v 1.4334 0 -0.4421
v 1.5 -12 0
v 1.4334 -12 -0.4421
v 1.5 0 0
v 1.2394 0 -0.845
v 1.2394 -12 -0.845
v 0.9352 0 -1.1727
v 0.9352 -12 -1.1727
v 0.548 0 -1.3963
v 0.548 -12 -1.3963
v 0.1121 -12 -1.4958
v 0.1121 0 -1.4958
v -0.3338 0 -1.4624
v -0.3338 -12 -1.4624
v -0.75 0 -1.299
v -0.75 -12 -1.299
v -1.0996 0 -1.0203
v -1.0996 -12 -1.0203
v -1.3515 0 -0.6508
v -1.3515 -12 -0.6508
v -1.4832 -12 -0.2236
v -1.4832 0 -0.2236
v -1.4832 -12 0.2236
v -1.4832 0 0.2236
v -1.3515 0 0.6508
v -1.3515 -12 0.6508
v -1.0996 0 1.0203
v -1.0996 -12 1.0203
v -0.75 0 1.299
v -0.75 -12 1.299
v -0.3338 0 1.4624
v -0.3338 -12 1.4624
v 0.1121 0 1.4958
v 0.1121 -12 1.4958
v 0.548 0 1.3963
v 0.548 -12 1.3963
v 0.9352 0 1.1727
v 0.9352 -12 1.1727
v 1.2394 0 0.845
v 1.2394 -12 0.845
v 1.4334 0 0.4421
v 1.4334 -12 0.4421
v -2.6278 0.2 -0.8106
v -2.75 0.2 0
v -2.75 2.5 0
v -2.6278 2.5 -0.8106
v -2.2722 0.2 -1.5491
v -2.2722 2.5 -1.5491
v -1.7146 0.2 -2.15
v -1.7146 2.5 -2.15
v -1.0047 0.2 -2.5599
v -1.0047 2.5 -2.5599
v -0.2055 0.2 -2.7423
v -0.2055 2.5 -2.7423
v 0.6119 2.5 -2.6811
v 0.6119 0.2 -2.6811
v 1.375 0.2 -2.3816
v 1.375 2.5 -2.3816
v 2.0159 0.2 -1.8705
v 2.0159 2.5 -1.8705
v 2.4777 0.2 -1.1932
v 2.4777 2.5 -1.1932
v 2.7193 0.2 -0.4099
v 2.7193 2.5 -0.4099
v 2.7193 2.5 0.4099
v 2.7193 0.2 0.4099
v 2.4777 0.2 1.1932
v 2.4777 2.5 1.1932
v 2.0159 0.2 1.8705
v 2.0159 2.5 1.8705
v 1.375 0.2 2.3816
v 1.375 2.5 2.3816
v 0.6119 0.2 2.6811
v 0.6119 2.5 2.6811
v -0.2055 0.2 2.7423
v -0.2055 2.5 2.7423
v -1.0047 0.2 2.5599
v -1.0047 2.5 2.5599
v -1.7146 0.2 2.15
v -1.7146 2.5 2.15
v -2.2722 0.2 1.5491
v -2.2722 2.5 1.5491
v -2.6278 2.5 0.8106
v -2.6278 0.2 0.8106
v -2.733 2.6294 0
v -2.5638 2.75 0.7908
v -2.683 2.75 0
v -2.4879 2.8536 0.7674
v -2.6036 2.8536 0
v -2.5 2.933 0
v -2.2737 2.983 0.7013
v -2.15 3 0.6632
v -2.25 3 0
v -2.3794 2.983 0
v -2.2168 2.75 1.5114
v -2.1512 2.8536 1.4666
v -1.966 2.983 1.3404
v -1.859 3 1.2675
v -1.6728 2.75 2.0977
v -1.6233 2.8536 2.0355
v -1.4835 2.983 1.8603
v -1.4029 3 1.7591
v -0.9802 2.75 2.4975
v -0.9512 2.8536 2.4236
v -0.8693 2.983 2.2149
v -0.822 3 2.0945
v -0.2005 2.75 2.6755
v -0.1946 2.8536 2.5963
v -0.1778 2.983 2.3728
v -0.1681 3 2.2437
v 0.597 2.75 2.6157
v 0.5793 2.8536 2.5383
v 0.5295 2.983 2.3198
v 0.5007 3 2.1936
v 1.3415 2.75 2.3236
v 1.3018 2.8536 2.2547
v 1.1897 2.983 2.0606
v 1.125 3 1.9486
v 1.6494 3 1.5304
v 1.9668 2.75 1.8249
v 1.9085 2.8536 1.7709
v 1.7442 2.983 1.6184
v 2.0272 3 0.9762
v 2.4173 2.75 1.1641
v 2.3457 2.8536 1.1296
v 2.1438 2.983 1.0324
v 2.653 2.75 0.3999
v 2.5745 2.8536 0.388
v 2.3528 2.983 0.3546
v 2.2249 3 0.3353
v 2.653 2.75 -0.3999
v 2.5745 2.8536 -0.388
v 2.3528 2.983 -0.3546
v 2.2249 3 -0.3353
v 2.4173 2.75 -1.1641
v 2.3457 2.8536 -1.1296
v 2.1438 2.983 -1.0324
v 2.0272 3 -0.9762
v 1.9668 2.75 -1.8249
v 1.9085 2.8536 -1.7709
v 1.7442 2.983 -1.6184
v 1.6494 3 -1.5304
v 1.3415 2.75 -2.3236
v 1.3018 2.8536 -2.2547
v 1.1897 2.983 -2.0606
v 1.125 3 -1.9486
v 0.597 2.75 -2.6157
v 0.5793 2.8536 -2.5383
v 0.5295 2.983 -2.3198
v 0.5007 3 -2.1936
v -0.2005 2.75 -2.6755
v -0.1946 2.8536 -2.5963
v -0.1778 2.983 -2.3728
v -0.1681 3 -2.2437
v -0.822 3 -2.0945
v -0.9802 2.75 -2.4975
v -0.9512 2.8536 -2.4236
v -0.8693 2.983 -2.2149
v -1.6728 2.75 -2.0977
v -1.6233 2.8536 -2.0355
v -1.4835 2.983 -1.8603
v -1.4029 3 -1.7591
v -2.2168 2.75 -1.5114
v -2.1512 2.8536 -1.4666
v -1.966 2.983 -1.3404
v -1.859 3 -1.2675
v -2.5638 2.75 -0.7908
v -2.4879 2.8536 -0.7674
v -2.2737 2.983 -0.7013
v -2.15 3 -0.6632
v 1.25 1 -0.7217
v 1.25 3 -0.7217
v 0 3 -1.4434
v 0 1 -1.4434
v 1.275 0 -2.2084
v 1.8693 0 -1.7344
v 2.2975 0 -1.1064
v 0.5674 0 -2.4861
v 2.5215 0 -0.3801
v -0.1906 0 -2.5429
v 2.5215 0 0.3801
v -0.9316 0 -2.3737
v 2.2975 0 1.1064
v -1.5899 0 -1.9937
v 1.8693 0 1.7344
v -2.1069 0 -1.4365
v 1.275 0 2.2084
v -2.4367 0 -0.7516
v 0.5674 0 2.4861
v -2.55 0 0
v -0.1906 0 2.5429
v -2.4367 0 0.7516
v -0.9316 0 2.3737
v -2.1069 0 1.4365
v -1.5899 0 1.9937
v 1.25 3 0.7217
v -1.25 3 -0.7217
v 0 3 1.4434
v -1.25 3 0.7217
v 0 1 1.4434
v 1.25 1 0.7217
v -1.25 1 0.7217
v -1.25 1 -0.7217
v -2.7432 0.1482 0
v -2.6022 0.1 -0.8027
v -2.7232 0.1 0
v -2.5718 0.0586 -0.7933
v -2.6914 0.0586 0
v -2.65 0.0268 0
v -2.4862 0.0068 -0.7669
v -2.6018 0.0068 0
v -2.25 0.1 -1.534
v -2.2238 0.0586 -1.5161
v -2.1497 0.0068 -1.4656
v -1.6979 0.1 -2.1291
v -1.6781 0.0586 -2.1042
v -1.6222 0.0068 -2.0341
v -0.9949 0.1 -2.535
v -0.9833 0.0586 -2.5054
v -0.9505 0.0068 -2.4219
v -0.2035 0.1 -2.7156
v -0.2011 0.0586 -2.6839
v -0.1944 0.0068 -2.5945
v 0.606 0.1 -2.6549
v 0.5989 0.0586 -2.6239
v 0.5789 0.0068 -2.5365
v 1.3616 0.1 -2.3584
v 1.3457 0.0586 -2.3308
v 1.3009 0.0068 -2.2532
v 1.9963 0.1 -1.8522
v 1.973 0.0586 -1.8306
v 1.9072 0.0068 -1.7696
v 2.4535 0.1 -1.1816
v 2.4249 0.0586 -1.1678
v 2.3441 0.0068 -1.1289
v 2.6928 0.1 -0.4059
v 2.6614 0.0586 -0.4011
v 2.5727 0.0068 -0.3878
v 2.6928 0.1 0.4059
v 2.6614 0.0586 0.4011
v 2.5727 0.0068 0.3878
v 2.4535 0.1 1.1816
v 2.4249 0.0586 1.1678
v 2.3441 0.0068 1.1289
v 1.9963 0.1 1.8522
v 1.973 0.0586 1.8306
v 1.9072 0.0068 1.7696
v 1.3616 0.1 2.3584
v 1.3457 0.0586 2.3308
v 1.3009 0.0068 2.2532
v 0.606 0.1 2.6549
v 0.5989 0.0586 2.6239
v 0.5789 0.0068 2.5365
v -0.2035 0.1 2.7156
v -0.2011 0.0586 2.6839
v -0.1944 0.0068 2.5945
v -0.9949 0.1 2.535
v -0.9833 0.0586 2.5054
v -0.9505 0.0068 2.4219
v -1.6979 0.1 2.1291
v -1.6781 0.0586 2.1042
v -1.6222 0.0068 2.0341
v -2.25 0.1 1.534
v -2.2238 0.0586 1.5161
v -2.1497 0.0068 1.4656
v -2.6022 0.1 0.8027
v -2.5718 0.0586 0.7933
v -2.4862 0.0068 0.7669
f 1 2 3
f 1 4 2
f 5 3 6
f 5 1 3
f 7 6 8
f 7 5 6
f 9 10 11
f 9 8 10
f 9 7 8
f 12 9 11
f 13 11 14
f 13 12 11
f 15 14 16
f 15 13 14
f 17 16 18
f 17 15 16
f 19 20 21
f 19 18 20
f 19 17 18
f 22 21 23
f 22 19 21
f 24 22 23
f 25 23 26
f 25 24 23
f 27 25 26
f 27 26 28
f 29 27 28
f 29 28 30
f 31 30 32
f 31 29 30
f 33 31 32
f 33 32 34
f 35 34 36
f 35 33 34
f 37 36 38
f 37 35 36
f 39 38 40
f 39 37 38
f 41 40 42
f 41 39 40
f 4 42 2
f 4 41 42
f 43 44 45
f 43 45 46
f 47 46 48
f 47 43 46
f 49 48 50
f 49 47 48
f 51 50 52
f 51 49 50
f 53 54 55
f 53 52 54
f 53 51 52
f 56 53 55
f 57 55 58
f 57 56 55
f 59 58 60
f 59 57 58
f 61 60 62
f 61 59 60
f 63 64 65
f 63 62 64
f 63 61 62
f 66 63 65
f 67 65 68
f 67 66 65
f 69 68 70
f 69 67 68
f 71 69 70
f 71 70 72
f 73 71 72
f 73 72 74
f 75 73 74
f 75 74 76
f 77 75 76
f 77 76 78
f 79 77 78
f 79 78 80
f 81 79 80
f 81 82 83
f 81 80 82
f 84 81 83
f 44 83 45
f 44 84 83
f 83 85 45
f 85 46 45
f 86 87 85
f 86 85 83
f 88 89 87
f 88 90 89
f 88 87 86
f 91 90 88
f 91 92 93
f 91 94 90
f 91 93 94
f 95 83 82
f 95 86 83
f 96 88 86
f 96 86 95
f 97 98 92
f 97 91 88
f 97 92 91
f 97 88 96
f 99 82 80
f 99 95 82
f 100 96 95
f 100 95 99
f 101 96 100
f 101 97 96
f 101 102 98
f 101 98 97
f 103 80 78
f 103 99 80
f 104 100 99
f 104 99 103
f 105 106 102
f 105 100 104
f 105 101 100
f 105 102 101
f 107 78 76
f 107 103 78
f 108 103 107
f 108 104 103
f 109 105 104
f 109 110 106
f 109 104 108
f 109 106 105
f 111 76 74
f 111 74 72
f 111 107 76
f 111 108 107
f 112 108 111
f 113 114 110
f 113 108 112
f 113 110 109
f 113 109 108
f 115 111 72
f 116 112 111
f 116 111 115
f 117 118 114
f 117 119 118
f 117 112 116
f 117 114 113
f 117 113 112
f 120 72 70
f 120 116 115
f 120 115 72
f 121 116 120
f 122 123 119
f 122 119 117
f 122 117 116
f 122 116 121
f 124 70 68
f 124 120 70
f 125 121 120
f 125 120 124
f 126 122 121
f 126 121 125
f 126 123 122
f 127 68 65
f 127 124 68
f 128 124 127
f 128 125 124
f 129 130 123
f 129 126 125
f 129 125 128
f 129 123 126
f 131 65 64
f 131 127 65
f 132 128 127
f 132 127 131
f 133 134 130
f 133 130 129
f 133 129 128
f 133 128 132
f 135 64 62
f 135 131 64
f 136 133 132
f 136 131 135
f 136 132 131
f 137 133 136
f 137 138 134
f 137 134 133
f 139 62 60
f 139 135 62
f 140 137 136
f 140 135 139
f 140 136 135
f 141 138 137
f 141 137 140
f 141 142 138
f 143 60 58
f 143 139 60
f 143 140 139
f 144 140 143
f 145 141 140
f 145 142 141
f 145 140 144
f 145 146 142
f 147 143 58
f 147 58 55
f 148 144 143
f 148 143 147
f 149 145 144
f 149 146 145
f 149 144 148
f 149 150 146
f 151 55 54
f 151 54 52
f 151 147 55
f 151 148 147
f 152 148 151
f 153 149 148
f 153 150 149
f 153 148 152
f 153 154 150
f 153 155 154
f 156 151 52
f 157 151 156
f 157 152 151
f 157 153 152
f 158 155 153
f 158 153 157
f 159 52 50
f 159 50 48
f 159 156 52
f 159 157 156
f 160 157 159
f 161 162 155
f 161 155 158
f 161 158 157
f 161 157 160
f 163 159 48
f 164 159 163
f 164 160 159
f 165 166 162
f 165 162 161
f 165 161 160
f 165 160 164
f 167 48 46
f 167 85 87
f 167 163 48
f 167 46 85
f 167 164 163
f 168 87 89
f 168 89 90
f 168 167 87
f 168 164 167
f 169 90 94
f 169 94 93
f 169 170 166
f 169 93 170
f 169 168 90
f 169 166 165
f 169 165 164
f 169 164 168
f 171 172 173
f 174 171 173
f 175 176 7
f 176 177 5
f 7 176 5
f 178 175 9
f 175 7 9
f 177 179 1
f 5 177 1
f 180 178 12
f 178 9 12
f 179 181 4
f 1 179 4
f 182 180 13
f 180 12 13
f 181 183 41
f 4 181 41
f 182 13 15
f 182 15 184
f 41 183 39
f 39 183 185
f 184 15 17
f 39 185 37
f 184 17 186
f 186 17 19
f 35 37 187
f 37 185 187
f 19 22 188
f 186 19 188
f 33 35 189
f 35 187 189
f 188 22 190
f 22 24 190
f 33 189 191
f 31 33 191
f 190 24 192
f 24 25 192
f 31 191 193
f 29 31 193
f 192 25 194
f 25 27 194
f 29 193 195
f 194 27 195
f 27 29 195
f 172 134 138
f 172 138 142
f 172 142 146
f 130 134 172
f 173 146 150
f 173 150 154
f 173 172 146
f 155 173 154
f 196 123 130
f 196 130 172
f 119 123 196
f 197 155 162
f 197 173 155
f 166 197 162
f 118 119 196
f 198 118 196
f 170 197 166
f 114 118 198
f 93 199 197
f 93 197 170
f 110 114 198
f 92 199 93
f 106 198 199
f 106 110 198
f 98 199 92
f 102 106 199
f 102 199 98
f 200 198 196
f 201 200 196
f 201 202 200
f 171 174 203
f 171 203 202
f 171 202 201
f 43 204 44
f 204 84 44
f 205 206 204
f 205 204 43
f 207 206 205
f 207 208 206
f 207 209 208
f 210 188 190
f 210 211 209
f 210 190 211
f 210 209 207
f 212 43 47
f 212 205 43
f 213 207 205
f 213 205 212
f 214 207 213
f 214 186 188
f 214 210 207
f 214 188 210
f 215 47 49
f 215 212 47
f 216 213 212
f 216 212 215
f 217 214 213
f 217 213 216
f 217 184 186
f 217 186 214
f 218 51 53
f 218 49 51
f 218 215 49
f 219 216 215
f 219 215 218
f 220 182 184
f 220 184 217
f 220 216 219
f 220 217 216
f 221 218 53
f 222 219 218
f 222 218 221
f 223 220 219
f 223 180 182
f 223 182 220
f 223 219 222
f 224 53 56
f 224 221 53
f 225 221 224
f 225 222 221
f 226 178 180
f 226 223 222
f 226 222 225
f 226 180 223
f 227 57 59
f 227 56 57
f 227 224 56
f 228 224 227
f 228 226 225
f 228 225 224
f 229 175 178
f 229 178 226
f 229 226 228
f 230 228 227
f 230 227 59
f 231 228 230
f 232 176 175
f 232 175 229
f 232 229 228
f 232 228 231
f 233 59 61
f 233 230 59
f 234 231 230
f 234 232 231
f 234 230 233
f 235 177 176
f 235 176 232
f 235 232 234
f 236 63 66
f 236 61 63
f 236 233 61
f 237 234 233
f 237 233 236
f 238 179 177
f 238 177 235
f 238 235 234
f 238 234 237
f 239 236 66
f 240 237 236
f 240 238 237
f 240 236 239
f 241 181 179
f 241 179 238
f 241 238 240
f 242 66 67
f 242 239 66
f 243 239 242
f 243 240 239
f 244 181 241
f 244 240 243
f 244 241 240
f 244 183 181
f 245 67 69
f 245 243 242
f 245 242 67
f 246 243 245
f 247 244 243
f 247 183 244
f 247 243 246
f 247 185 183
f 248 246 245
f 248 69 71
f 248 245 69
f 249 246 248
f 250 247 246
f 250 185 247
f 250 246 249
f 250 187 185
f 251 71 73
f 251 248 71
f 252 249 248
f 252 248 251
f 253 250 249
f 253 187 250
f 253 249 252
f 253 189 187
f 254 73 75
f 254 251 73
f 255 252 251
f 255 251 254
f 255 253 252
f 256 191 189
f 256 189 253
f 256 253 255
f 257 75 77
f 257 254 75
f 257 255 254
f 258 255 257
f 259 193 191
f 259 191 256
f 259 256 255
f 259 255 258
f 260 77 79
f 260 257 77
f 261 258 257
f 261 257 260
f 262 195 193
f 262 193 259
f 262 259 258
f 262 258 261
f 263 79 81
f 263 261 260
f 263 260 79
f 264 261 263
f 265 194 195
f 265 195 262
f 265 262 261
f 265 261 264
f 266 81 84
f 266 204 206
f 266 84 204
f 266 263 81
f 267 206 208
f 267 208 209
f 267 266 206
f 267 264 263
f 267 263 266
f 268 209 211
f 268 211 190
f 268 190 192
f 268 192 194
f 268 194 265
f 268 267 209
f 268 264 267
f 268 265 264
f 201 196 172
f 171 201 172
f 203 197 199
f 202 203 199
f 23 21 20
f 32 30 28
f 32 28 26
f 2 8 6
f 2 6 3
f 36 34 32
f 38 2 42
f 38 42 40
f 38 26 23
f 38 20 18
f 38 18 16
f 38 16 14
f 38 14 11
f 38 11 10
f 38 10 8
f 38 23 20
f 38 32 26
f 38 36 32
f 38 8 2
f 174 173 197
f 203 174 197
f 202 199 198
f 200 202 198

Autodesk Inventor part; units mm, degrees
ref_plane "YZ Plane" through (0, 0, 0) normal (1, 0, 0) x (0, 1, 0)
ref_plane "XZ Plane" through (0, 0, 0) normal (0, 1, 0) x (-1, 0, 0)
ref_plane "XY Plane" through (0, 0, 0) normal (0, 0, 1) x (1, 0, 0)
sketch "スケッチ1" plane through (0, 0, 0) normal (0, 1, 0) x (-1, 0, 0)
  circle A0 centre (0, 0) radius 2.75
  dimension "d0" = 5.5
extrude "押し出し1" add sketch "スケッチ1" along normal blind 3
sketch "スケッチ2" plane through (0, 0, 0) normal (0, -1, 0) x (1, 0, 0)
  circle A0 centre (0, 0) radius 1.5
  dimension "d3" = 3
extrude "押し出し2" add sketch "スケッチ2" along normal blind 12
fillet "フィレット1" radius 0.5 1 edges at (2.75, 3, 0)
fillet "フィレット1" radius 0.2 1 edges at (2.75, 0, 0)
sketch "スケッチ3" plane through (0, 3, 0) normal (0, 1, 0) x (1, 0, 0)
  line L0 (0, 1.4434) -> (-1.25, 0.7217)
  line L1 (-1.25, 0.7217) -> (-1.25, -0.7217)
  line L2 (-1.25, -0.7217) -> (0, -1.4434)
  line L3 (0, -1.4434) -> (1.25, -0.7217)
  line L4 (1.25, -0.7217) -> (1.25, 0.7217)
  line L5 (1.25, 0.7217) -> (0, 1.4434)
  line L6 (0, 1.4434) -> (0, -1.4434) construction
  circle A0 centre (0, 0) radius 1.4434 construction
  dimension "d12" = 2.5
extrude "押し出し3" cut sketch "スケッチ3" against normal blind 2
thread "ねじ1" size "M3x0.5" class "6g" standard "ANSI Metric M Profile" full length
properties part number "M3-CapScrew"
